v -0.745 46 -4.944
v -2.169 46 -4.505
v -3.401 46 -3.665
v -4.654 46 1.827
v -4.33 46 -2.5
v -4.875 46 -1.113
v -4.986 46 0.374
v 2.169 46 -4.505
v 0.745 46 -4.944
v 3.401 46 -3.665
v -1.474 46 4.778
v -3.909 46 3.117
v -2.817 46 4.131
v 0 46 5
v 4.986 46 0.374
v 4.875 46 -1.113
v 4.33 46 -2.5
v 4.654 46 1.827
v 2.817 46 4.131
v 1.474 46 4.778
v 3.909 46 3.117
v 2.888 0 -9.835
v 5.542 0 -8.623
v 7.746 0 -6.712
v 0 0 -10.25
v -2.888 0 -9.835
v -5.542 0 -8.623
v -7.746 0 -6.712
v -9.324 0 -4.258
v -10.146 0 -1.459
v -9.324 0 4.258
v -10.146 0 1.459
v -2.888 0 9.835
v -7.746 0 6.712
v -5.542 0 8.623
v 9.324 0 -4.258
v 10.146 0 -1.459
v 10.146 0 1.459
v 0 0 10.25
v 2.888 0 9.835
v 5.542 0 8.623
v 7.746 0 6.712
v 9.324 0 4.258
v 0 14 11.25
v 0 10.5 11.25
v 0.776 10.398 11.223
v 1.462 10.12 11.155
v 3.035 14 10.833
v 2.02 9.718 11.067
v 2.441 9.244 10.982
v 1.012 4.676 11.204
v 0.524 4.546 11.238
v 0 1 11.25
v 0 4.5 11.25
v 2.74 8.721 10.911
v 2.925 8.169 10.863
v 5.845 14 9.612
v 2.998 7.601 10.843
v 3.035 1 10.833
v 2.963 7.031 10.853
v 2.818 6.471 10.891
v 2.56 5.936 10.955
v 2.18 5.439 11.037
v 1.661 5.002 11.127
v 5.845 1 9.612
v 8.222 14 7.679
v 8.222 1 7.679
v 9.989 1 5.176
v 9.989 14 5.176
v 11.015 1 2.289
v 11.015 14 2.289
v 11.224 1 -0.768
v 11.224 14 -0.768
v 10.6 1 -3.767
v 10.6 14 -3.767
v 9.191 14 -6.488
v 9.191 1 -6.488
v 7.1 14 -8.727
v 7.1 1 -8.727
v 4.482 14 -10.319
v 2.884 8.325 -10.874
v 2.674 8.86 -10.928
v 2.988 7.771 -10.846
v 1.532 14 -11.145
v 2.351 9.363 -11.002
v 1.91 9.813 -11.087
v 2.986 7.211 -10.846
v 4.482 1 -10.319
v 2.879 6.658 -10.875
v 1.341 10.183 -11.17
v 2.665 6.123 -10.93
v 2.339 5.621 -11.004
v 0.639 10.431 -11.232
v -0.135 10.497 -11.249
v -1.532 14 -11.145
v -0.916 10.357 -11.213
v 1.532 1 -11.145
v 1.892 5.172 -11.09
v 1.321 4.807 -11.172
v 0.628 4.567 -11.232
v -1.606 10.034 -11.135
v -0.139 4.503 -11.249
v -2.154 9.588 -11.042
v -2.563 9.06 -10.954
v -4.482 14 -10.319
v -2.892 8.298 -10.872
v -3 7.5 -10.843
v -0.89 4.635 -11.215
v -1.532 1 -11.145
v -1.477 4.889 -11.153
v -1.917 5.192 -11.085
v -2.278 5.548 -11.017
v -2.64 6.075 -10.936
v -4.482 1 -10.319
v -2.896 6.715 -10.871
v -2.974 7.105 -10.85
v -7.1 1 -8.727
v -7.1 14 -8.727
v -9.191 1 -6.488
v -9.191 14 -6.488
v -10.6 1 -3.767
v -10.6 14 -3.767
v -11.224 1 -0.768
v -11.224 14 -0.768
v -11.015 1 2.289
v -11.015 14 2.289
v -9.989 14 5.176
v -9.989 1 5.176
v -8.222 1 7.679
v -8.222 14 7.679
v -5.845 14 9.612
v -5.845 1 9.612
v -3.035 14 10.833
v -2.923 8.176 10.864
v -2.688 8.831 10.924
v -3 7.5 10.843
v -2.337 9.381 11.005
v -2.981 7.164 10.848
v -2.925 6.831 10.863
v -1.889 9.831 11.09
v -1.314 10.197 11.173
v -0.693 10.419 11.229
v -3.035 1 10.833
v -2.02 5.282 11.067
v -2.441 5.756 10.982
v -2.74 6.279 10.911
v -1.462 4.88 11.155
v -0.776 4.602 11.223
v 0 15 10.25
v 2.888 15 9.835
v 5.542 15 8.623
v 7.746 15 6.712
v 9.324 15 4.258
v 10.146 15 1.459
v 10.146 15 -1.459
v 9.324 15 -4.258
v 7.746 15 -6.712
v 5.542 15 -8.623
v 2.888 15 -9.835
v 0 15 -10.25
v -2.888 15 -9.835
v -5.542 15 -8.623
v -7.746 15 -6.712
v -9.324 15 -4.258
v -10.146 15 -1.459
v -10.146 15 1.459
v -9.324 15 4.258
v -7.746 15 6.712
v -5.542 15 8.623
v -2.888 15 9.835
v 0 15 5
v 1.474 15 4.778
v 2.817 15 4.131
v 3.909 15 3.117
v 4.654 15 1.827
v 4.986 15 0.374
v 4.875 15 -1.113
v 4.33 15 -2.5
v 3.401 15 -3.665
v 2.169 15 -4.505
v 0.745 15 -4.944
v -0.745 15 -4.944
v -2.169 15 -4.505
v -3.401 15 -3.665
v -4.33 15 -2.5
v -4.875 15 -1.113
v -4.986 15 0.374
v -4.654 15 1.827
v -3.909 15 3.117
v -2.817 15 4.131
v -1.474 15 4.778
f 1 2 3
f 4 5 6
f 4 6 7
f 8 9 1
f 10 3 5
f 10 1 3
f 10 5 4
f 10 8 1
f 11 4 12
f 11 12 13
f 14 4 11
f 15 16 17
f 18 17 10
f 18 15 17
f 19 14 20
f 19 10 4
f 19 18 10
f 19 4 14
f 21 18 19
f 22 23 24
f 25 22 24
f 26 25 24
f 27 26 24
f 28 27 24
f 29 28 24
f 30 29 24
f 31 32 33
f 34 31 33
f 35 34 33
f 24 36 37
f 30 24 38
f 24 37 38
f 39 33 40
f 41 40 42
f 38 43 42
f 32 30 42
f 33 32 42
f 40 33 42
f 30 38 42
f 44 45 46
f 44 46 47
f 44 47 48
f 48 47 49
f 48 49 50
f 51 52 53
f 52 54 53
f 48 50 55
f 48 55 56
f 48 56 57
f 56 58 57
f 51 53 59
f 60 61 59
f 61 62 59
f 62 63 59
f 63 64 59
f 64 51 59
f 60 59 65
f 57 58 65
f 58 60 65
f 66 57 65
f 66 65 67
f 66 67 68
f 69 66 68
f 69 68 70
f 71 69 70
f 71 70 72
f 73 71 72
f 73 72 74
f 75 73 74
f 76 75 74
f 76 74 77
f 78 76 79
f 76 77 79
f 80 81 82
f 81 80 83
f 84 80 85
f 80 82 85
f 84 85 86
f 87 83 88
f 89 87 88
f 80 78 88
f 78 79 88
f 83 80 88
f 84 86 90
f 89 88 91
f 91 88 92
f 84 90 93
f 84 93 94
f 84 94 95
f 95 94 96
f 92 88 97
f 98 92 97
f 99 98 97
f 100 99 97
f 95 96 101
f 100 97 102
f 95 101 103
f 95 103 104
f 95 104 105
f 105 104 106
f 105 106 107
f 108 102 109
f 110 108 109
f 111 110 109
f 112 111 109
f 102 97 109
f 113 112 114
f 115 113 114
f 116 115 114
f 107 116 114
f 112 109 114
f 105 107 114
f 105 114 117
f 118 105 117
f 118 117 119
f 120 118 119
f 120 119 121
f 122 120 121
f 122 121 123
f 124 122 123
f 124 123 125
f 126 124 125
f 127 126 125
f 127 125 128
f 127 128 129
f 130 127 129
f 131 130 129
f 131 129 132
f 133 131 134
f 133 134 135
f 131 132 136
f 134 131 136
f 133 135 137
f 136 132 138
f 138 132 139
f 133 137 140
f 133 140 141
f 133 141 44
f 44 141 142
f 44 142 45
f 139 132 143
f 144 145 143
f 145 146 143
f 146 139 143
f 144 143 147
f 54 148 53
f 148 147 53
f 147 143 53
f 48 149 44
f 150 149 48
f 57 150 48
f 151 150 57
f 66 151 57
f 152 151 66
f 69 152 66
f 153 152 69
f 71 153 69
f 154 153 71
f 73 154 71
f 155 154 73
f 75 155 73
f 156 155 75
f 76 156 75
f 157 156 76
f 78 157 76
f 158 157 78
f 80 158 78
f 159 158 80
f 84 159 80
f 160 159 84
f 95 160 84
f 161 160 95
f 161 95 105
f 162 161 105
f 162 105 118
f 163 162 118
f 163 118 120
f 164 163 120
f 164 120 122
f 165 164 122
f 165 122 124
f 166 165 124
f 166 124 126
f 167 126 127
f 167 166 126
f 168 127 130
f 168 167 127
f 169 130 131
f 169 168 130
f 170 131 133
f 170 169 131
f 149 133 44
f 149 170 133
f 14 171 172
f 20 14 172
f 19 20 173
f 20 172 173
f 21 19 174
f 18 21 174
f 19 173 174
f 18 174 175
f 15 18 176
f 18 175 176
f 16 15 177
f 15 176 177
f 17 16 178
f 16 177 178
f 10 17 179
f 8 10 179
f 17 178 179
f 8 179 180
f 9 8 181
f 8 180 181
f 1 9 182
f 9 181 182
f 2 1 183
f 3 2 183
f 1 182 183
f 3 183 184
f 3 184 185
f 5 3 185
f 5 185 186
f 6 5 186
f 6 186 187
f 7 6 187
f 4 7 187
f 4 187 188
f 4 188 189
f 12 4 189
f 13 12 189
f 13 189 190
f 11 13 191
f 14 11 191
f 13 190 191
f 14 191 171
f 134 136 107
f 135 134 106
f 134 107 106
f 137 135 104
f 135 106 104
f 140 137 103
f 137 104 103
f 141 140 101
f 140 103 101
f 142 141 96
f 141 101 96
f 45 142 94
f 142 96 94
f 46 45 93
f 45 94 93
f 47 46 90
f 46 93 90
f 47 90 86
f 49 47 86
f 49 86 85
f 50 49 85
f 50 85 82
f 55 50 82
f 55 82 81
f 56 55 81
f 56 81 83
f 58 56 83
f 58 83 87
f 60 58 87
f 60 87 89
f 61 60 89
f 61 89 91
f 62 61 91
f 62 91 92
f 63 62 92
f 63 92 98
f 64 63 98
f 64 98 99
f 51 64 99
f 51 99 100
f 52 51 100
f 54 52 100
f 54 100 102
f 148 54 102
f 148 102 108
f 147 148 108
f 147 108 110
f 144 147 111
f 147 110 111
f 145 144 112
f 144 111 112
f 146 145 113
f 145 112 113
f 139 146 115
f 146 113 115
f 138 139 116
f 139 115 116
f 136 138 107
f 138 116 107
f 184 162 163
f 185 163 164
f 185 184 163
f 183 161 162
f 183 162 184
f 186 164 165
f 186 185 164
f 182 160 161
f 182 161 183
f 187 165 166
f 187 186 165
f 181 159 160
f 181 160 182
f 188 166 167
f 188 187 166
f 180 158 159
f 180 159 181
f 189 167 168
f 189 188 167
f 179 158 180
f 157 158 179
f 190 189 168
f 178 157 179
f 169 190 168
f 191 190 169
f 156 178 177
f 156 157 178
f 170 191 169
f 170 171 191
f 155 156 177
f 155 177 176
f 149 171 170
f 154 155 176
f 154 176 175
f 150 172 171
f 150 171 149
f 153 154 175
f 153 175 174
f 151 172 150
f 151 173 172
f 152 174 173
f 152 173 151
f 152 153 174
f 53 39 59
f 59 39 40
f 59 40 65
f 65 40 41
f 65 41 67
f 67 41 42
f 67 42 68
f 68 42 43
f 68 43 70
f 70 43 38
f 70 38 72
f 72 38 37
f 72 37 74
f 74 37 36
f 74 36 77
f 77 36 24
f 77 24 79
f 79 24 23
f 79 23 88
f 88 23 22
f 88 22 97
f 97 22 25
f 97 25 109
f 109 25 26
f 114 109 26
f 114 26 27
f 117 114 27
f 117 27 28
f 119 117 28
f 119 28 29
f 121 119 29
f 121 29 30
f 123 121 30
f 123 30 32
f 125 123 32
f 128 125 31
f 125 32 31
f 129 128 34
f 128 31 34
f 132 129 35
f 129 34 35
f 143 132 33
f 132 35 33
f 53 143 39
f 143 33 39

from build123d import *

# Parameters (mm, degrees)
SKETCH_1_R      = 11.25
EXTRUDE_1_DEPTH = 15
SKETCH_2_R      = 5
EXTRUDE_2_DEPTH = 31
CHAMFER_1_SIZE  = 1
F_6_0MM_2_D     = 6


with BuildPart() as part:
    # 草图1 → 凸台-拉伸1 (new body)
    with BuildSketch(Plane(origin=(0, 0, 0), x_dir=(1, 0, 0), z_dir=(0, 1, 0))):
        with Locations(Location((0, 0, 0), (0, 0, 270))):
            Circle(SKETCH_1_R)
    extrude(amount=EXTRUDE_1_DEPTH)

    # 草图2 → 凸台-拉伸2 (add)
    with BuildSketch(Plane(origin=(0, 15, 0), x_dir=(1, 0, 0), z_dir=(0, 1, 0))):
        with Locations(Location((0, 0, 0), (0, 0, 270))):
            Circle(SKETCH_2_R)
    extrude(amount=EXTRUDE_2_DEPTH)

    # 倒角1
    chamfer_1_edges = [part.edges().sort_by_distance(p)[0] for p in [
        (0, 0, -11.25),
        (0, 15, -11.25),
    ]]
    chamfer(chamfer_1_edges, length=CHAMFER_1_SIZE)

    # Ø6.0mm 暗销孔2 (through all)
    with Locations(Plane(origin=(0, 7.5, 11.25), x_dir=(1, 0, 0), z_dir=(0, 0, 1))):
        with Locations((0, 0)):
            Hole(F_6_0MM_2_D / 2)


solid = part.part
